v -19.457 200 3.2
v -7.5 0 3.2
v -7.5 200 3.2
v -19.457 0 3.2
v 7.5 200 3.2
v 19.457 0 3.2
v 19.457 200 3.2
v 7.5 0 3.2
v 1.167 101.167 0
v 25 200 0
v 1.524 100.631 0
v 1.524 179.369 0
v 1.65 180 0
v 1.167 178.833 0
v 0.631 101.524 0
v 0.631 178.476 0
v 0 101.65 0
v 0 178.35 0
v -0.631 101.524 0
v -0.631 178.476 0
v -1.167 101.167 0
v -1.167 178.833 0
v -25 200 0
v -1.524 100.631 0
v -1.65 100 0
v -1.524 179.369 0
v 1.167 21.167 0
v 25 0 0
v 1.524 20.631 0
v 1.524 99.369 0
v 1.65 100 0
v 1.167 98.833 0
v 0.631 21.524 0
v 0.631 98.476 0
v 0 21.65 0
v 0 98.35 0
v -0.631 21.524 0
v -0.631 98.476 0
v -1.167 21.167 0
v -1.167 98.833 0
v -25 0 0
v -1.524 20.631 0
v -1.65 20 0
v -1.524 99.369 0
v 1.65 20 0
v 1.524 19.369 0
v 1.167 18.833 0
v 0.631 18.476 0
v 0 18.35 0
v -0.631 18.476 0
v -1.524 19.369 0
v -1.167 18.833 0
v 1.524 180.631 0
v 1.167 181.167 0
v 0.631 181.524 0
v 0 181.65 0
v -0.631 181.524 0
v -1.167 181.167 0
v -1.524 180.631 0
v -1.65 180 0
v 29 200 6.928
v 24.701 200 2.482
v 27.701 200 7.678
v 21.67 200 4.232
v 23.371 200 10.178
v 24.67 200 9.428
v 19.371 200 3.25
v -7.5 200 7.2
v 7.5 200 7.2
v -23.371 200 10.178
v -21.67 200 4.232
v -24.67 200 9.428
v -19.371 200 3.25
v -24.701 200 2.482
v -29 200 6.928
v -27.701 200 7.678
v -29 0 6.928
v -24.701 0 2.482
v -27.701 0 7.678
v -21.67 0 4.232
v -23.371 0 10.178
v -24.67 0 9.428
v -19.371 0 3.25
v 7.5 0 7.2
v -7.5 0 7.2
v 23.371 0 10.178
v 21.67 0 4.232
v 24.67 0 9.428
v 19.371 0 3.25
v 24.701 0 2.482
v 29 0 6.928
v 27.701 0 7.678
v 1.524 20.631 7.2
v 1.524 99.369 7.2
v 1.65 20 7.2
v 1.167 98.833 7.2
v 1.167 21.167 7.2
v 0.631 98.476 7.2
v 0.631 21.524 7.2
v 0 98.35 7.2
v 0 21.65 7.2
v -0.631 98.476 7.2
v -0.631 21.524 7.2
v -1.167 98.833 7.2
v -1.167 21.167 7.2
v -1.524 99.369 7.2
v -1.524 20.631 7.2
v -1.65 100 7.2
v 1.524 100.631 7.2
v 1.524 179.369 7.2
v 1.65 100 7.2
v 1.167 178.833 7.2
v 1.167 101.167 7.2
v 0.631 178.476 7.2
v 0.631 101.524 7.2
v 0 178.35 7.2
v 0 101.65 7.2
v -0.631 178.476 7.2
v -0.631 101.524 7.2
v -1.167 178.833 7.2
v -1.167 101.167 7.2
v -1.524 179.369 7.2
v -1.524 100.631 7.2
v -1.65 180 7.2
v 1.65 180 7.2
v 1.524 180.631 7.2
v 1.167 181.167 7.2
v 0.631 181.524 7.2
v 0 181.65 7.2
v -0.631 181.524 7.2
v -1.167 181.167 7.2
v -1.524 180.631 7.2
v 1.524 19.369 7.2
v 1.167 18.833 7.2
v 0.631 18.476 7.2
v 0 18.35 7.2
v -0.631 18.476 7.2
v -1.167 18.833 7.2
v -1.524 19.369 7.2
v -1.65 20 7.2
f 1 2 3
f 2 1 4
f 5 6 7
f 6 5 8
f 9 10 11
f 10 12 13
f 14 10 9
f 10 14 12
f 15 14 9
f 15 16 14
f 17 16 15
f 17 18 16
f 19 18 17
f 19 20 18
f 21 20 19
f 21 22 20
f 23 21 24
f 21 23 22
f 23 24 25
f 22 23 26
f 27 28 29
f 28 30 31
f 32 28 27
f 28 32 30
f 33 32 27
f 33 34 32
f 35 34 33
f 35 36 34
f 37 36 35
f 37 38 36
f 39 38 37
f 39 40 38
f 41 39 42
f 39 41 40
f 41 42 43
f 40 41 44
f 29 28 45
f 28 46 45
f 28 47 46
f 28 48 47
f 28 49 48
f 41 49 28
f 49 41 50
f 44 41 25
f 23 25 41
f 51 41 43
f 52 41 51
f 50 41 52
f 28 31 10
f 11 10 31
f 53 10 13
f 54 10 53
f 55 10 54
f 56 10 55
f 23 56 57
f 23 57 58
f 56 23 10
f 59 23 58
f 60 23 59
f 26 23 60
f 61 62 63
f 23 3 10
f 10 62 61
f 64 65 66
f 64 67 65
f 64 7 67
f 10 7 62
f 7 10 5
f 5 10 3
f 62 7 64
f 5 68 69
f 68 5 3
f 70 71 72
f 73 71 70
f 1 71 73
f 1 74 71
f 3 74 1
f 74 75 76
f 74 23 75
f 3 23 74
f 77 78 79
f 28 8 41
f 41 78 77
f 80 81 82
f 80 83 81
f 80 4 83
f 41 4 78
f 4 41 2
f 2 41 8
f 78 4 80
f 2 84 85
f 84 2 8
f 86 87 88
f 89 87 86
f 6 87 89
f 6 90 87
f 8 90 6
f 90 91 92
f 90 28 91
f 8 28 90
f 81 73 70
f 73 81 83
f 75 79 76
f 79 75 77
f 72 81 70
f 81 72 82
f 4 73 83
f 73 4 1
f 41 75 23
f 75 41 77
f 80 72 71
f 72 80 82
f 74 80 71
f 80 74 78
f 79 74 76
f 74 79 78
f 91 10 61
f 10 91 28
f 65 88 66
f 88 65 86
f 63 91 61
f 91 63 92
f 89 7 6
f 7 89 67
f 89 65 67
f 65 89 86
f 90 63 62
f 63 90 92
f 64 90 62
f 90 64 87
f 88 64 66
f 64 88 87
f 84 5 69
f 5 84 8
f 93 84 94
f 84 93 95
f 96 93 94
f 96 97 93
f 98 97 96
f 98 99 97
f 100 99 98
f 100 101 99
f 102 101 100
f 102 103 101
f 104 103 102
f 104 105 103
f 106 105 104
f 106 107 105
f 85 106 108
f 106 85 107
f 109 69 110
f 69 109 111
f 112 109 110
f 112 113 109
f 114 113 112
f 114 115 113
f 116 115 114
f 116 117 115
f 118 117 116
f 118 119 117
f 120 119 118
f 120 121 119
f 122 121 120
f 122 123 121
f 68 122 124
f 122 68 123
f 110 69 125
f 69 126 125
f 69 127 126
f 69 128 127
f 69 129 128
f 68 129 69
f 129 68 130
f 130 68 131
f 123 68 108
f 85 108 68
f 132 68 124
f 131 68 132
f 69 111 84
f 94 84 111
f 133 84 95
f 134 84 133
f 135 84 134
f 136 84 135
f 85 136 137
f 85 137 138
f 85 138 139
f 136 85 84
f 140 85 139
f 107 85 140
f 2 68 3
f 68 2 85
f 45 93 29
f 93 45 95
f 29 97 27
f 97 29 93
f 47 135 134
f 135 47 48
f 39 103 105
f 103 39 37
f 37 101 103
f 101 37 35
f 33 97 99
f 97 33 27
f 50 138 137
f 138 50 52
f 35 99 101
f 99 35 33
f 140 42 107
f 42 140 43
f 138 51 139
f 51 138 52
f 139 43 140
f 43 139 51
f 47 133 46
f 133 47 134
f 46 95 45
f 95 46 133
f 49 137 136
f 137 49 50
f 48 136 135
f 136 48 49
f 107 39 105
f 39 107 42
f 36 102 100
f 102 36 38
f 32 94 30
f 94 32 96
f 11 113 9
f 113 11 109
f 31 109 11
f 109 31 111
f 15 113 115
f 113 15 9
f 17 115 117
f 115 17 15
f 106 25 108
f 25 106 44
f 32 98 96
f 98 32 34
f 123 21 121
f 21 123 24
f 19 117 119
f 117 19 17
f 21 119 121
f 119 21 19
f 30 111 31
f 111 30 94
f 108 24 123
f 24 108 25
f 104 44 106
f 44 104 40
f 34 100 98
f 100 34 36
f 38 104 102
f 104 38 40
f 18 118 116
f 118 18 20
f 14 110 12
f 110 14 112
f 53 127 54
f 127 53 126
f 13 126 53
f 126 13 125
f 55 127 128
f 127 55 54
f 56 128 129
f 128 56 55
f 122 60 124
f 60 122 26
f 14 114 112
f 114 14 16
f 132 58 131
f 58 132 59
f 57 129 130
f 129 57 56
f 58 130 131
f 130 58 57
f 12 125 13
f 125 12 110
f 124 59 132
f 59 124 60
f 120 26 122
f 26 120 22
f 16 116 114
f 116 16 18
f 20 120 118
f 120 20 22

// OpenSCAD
// Mini Kossel draight shield holders

height=200;
width=50;
standoff=4;
thickness=3.2;			// thickness of main plate
slotWall=1.5;			// thickness around slot
extrusion=15;
slotWidth=3.5;
slotDepth=6;
retainerExtraDepth=2;
holeHeights=[20,height/2,height-20];
holeDiameter=3.3;

overlap=1;
slotCubeWidth=slotWidth+2*slotWall;

module slot() {
translate([-(slotWidth+2*slotWall)/2,0])
	difference() {
		cube([slotWidth+2*slotWall,height,slotDepth+retainerExtraDepth]);
		translate([slotWall,-overlap,retainerExtraDepth])
			cube([slotWidth,height+2*overlap,slotDepth+overlap]);
	}
}

difference() {
	union() {
		difference() {
			translate([-width/2,0,0]) cube([50,200,thickness]);
			translate([-(width-slotCubeWidth)/2,0,thickness])
				rotate([0,-30,0]) 
					translate([-(slotCubeWidth+2)/2,-overlap,0])
						cube([slotCubeWidth+2,height+2*overlap,20]);
			translate([(width-slotCubeWidth)/2,0,thickness])
				rotate([0,30,0]) 
					translate([-(slotCubeWidth+2)/2,-overlap,0])
						cube([slotCubeWidth+2,height+2*overlap,20]);
		}
		translate([-extrusion/2,0,thickness-overlap])
			cube([extrusion,height,standoff+overlap]);
		translate([-width/2+slotCubeWidth*cos(30)/2,0,slotCubeWidth*sin(30)/2])
			rotate([0,-30,0]) slot();
		translate([width/2-slotCubeWidth*cos(30)/2,0,slotCubeWidth*sin(30)/2])
			rotate([0,30,0]) slot();
	}
 	for (i=holeHeights) {
		translate([0,i,-overlap])
			cylinder(r=holeDiameter/2,h=thickness+standoff+2*overlap,$fn=16);
	}
}
